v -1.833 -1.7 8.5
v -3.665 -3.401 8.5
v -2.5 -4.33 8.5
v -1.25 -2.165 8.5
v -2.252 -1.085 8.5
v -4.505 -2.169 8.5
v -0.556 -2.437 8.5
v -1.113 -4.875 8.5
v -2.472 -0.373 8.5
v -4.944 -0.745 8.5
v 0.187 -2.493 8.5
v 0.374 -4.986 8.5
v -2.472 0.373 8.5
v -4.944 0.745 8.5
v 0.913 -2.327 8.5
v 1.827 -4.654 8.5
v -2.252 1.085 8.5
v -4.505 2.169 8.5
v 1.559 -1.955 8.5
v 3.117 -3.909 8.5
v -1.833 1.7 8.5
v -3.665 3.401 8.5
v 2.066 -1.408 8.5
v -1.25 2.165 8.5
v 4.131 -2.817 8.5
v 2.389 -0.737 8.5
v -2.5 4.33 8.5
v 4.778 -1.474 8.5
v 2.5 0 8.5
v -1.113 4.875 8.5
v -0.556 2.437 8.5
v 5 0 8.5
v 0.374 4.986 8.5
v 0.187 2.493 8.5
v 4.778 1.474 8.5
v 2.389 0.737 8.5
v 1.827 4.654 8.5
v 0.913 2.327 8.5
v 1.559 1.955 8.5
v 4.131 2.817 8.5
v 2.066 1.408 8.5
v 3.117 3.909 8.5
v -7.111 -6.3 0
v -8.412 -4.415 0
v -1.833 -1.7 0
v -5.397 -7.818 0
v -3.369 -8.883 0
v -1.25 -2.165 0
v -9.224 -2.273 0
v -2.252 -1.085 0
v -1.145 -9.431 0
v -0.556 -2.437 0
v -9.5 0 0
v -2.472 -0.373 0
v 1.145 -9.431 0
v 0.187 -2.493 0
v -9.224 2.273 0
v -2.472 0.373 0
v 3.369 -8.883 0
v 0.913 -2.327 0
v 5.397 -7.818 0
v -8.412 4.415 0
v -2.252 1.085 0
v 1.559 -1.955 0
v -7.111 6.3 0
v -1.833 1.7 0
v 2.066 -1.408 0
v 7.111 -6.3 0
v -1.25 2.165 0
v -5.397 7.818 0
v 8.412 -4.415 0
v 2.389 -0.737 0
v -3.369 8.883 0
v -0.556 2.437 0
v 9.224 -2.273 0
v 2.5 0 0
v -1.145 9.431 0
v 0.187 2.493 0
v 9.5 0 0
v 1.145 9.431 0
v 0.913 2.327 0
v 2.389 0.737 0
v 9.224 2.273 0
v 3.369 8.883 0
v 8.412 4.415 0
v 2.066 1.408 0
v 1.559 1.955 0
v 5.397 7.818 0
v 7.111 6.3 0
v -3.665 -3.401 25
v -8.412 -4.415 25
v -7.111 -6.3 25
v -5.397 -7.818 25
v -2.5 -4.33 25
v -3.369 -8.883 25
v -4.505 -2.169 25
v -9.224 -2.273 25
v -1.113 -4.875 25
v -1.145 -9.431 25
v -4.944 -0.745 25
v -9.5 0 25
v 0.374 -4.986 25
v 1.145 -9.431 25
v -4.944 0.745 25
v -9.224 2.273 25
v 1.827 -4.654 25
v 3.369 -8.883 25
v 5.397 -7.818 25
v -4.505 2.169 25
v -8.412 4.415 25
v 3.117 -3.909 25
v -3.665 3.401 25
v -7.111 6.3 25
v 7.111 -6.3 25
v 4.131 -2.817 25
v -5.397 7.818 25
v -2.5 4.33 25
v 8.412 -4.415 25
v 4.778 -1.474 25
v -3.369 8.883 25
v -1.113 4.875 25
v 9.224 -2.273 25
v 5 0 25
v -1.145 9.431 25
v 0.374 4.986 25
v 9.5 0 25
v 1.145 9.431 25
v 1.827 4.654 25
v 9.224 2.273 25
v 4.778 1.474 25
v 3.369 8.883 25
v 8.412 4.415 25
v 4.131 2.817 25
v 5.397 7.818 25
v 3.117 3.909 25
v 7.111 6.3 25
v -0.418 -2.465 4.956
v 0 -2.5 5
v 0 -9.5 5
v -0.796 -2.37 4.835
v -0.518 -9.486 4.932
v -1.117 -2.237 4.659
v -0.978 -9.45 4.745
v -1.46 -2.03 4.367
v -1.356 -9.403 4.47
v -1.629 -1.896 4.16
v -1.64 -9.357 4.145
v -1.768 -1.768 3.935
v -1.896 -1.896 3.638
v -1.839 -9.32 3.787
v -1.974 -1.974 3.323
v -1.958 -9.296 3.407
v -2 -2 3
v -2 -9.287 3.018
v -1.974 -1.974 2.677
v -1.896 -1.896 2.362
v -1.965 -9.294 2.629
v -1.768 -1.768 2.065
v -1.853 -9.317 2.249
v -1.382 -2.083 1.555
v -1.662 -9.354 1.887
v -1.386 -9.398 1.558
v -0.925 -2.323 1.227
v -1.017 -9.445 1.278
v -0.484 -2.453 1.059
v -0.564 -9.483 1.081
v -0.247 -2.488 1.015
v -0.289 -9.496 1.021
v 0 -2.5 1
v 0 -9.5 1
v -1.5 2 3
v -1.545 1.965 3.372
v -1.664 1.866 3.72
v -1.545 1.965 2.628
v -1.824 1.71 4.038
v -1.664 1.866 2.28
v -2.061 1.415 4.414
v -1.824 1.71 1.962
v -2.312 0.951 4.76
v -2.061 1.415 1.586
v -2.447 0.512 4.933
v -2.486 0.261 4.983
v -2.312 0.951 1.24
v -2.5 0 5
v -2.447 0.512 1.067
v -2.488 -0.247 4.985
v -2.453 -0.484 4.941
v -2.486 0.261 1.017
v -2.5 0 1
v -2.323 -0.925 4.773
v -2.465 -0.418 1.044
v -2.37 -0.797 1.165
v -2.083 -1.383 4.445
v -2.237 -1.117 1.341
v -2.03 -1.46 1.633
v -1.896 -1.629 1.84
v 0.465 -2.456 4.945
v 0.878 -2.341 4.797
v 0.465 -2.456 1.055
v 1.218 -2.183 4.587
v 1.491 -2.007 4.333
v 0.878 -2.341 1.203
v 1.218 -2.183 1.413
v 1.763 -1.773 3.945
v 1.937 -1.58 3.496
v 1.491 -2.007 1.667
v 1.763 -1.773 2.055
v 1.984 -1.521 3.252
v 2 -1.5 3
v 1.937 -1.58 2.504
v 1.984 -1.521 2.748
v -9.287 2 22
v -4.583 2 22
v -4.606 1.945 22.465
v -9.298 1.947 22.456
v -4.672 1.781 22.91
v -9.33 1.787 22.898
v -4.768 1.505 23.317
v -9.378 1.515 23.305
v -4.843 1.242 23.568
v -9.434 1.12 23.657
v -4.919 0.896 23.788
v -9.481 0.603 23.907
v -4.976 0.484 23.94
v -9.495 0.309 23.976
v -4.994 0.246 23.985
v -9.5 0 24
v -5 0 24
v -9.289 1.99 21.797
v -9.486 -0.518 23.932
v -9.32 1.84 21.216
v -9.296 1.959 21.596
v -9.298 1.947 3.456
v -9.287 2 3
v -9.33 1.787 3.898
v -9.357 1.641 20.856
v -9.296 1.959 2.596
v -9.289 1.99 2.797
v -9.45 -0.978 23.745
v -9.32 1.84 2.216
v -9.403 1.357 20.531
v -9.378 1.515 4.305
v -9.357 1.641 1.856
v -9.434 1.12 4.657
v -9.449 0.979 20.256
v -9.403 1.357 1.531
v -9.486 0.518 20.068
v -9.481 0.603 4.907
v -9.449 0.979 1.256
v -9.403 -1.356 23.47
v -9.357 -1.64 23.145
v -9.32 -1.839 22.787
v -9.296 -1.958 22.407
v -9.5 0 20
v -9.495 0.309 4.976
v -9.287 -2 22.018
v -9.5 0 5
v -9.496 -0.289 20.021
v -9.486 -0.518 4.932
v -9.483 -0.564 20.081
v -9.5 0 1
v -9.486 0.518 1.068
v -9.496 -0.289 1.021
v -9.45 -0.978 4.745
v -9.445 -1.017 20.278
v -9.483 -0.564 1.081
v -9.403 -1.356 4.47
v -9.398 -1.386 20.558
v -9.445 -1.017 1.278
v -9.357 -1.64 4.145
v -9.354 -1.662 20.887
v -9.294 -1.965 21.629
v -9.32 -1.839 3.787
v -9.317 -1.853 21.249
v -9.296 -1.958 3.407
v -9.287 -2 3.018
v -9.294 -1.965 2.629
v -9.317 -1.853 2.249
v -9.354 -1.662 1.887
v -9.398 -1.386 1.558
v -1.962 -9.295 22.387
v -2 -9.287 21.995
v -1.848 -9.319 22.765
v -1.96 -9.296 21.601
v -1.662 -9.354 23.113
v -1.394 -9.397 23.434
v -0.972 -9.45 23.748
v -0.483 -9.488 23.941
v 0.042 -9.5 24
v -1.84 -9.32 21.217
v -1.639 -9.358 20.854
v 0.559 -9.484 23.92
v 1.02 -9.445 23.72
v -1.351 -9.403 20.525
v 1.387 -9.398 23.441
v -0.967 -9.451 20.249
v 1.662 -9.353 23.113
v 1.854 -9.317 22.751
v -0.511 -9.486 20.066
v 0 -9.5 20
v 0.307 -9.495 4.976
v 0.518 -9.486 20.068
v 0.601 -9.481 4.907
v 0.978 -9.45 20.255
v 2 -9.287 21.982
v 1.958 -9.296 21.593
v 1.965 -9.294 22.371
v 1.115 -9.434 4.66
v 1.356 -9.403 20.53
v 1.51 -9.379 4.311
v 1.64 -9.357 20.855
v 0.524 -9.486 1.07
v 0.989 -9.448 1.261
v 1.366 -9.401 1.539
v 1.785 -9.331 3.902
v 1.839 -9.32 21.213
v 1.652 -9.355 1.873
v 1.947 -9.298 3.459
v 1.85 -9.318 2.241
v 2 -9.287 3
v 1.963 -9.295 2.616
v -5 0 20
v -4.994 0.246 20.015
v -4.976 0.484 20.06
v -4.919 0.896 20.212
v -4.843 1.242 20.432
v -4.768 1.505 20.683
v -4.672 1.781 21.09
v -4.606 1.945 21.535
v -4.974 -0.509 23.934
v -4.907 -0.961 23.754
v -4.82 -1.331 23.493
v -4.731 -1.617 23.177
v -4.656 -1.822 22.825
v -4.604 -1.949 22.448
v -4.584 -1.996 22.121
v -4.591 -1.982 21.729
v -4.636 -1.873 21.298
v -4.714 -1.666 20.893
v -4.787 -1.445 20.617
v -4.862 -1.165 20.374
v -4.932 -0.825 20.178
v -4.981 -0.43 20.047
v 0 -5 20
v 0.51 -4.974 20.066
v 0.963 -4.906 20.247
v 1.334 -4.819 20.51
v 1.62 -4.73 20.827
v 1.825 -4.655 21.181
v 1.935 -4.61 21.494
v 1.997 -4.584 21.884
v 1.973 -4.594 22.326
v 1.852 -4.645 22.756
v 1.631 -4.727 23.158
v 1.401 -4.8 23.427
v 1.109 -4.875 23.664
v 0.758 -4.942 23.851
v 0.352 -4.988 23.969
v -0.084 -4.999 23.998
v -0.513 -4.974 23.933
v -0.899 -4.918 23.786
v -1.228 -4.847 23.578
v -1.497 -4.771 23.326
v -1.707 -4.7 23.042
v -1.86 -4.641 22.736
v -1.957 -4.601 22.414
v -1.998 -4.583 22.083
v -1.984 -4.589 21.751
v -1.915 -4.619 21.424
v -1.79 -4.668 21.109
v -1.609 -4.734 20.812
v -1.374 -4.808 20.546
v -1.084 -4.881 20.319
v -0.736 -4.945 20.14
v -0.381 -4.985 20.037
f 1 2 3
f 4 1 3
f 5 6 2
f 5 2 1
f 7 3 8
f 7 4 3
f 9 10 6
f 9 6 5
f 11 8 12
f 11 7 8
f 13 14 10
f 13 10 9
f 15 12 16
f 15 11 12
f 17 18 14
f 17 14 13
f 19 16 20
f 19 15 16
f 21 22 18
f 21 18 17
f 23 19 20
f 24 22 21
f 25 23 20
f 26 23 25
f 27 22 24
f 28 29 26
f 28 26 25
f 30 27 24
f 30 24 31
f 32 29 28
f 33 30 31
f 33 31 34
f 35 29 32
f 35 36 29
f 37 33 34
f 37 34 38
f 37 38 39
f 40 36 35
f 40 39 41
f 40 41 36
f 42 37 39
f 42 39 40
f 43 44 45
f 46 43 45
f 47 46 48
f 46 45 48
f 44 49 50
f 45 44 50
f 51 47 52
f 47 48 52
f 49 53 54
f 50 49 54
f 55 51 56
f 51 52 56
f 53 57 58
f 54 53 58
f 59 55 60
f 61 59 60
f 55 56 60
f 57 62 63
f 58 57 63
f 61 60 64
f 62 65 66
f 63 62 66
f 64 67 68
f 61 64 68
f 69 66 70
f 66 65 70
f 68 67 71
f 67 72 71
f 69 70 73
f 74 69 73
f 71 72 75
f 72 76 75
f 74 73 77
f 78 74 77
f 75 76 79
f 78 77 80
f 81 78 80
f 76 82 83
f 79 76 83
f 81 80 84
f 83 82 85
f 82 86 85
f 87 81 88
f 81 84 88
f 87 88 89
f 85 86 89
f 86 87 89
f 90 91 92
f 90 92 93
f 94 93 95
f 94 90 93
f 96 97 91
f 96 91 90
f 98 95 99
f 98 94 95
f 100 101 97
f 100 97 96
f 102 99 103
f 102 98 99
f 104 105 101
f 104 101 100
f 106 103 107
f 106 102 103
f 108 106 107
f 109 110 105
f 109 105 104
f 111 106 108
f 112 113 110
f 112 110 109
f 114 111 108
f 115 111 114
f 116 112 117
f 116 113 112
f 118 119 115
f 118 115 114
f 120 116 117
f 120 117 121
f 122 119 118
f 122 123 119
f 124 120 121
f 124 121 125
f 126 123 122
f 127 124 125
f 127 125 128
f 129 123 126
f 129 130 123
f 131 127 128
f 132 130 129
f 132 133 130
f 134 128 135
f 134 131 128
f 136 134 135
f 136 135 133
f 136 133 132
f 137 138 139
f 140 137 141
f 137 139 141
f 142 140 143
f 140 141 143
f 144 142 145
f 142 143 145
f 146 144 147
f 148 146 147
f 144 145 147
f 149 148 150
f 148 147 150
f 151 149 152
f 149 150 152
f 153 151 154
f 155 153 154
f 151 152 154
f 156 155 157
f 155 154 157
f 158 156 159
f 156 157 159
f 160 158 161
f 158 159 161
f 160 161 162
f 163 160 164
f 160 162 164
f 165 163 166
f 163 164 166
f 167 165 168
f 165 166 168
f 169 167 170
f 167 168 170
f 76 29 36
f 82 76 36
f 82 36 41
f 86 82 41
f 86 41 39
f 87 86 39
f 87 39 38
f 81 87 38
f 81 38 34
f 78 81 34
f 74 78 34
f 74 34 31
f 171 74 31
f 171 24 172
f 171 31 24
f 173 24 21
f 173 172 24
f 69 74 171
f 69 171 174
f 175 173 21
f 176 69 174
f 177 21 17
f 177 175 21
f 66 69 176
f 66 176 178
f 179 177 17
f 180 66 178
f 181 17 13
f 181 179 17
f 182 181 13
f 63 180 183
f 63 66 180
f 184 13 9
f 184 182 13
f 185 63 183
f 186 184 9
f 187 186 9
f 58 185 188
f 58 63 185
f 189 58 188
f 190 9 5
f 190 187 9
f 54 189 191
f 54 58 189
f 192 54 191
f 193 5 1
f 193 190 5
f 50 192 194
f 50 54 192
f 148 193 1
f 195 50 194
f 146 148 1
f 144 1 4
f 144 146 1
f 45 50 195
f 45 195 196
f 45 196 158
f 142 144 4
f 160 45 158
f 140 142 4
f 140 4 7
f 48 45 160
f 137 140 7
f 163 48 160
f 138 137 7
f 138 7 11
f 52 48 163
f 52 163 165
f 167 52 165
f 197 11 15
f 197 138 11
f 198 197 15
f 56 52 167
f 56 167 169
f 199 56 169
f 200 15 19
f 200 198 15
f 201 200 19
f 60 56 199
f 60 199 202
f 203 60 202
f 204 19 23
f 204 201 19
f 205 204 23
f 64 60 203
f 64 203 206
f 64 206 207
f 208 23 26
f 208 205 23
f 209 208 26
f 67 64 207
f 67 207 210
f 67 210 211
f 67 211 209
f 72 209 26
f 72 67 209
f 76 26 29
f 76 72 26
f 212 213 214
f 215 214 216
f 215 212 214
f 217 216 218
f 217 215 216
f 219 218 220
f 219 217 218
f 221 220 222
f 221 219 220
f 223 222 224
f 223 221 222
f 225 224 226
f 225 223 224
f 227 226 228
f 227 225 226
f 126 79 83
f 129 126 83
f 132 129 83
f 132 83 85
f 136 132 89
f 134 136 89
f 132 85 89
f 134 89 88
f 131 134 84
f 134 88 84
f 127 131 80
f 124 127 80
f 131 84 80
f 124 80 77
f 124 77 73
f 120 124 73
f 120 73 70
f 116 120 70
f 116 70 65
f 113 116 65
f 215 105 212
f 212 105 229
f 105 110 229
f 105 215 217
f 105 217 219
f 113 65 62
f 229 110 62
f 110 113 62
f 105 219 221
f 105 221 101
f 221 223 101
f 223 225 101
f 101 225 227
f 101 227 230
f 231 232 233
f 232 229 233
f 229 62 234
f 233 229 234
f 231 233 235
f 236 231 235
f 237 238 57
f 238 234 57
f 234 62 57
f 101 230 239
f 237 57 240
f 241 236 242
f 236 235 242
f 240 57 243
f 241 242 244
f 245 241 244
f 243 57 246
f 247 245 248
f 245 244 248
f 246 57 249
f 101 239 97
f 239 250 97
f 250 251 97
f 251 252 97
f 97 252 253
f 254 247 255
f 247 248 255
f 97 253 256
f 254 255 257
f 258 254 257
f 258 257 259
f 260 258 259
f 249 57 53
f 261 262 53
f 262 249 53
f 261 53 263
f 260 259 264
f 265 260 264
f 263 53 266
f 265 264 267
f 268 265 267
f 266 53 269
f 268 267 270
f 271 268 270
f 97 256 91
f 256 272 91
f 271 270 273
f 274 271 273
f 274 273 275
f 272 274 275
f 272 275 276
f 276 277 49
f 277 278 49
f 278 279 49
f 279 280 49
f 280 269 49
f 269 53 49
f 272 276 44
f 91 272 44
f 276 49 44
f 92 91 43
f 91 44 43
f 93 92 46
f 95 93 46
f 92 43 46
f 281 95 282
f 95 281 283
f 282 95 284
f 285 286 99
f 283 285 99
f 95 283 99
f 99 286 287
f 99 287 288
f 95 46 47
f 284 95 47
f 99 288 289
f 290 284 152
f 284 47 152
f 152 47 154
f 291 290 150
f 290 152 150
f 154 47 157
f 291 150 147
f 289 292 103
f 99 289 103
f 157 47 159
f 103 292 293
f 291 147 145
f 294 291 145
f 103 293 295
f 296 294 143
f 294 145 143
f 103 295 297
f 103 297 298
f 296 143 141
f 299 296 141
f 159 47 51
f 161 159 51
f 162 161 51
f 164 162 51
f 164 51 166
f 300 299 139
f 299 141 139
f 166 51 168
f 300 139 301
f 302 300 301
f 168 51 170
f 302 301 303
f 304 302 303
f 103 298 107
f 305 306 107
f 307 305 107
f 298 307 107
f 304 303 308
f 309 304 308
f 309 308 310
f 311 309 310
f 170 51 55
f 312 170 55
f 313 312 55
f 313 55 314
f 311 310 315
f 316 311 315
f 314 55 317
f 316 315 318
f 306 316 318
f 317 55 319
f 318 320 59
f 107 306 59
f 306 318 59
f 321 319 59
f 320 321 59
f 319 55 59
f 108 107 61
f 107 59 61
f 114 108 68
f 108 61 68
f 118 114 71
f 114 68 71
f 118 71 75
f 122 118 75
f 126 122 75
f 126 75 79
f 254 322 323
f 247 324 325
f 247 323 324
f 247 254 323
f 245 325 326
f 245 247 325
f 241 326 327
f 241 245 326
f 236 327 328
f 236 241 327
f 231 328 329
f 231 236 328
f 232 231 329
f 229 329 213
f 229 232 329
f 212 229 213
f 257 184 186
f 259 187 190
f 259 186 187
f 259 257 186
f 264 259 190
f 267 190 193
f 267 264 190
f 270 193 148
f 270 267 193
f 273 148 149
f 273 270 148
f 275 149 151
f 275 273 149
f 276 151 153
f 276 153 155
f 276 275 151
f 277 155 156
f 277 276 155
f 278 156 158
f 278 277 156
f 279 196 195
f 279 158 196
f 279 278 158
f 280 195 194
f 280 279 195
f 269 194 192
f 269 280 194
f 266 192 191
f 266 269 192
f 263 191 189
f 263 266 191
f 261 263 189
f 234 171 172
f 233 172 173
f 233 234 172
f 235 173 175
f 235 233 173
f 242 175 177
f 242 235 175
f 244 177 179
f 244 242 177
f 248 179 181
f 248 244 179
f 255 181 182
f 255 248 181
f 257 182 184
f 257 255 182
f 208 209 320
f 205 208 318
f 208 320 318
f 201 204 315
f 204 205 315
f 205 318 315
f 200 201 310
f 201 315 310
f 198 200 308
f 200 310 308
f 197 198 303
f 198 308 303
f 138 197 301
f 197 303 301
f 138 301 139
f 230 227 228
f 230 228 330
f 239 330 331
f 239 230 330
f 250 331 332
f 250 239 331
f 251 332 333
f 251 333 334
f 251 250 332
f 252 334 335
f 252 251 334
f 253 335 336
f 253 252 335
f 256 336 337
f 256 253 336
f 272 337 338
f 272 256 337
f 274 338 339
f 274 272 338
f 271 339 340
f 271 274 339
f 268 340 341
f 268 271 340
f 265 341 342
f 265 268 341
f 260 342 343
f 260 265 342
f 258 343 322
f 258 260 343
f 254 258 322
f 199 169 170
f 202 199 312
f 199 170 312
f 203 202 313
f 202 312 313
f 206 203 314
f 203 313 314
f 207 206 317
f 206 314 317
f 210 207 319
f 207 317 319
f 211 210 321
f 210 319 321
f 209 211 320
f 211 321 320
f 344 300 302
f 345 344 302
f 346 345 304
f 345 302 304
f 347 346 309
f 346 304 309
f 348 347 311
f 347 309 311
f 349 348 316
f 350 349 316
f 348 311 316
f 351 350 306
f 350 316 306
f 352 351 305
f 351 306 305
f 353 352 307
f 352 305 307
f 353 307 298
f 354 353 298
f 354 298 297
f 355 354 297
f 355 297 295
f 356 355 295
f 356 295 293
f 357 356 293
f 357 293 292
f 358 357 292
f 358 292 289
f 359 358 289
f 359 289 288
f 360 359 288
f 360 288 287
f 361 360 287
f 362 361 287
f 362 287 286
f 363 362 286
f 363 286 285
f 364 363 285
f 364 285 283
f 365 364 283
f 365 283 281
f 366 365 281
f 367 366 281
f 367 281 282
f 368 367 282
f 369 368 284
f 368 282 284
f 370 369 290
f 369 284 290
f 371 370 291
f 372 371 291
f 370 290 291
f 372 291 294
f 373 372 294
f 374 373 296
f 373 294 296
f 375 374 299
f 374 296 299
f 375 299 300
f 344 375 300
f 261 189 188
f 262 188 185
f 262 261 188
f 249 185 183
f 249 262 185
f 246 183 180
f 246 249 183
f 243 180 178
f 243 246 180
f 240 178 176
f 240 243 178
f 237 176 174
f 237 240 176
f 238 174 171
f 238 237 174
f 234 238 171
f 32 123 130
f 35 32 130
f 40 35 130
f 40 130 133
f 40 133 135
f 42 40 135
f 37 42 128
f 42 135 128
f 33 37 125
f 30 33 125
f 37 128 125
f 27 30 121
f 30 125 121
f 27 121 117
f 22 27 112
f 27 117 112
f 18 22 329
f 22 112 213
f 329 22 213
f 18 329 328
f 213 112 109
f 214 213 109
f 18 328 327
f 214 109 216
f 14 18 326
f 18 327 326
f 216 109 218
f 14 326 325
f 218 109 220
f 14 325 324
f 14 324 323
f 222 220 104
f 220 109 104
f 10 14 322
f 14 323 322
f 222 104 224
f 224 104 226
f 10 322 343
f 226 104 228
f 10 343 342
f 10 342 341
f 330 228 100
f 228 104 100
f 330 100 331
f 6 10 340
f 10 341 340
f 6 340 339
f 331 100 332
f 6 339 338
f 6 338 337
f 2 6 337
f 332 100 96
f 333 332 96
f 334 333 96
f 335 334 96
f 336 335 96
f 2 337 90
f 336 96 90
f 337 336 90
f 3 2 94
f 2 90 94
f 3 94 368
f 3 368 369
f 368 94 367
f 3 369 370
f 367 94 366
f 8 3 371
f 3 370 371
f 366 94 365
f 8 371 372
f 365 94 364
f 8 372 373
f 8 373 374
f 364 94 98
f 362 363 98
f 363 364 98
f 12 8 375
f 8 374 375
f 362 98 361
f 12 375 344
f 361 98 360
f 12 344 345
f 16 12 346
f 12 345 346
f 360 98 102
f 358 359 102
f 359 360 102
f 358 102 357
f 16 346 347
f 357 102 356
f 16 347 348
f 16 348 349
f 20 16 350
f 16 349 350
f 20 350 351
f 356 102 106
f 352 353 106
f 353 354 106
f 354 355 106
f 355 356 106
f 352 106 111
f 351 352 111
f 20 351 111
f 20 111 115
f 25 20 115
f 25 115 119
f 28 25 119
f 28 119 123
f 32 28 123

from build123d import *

# Parameters (mm, degrees)
SKETCH2_R           = 9.5
SKETCH2_R_2         = 2.5
BOSS_EXTRUDE1_DEPTH = 25
SKETCH3_R           = 5
CUT_EXTRUDE1_DEPTH  = 16.5
CUT_EXTRUDE2_DEPTH  = 16.5
SKETCH5_R           = 2
CUT_EXTRUDE3_DEPTH  = 9.5


with BuildPart() as part:
    # Sketch2 → Boss-Extrude1 (new body)
    with BuildSketch(Plane.XY):
        Circle(SKETCH2_R)
        Circle(SKETCH2_R_2, mode=Mode.SUBTRACT)
    extrude(amount=BOSS_EXTRUDE1_DEPTH)

    # Sketch3 → Cut-Extrude1 (cut)
    with BuildSketch(Plane.XY.offset(25)):
        Circle(SKETCH3_R)
    extrude(amount=-CUT_EXTRUDE1_DEPTH, mode=Mode.SUBTRACT)

    # Sketch4 → Cut-Extrude2 (cut)
    with BuildSketch(Plane(origin=(-15.41400196, 54.908076208, -53.970187191), x_dir=(0, 1, 0), z_dir=(1, 0, 0))):
        with BuildLine():
            ThreePointArc((-54.908076208, 58.970187191), (-56.908076208, 56.970187191), (-54.908076208, 54.970187191))
            Line((-54.908076208, 54.970187191), (-54.908076208, 58.970187191))
        make_face()
        with BuildLine():
            Line((-54.908076208, 58.970187191), (-54.908076208, 54.970187191))
            ThreePointArc((-54.908076208, 54.970187191), (-53.493862646, 55.555973629), (-52.908076208, 56.970187191))
            ThreePointArc((-52.908076208, 56.970187191), (-53.493862646, 58.384400753), (-54.908076208, 58.970187191))
        make_face()
        with BuildLine():
            ThreePointArc((-52.908076208, 75.970187191), (-53.493862646, 77.384400753), (-54.908076208, 77.970187191))
            Line((-54.908076208, 77.970187191), (-54.908076208, 73.970187191))
            ThreePointArc((-54.908076208, 73.970187191), (-53.493862646, 74.555973629), (-52.908076208, 75.970187191))
        make_face()
        with BuildLine():
            Line((-54.908076208, 73.970187191), (-54.908076208, 77.970187191))
            ThreePointArc((-54.908076208, 77.970187191), (-56.908076208, 75.970187191), (-54.908076208, 73.970187191))
        make_face()
    extrude(amount=CUT_EXTRUDE2_DEPTH, mode=Mode.SUBTRACT)

    # Sketch5 → Cut-Extrude3 (cut)
    with BuildSketch(Plane(origin=(-15.41400196, -10.091923792, -53.970187191), x_dir=(1, 0, 0), z_dir=(0, -1, 0))):
        with BuildLine():
            ThreePointArc((15.41400196, 58.970187191), (13.41400196, 56.970187191), (15.41400196, 54.970187191))
            Line((15.41400196, 54.970187191), (15.41400196, 58.970187191))
        make_face()
        with BuildLine():
            Line((15.41400196, 58.970187191), (15.41400196, 54.970187191))
            ThreePointArc((15.41400196, 54.970187191), (16.828215523, 55.555973629), (17.41400196, 56.970187191))
            ThreePointArc((17.41400196, 56.970187191), (16.828215523, 58.384400753), (15.41400196, 58.970187191))
        make_face()
        with Locations(Location((15.41400196, 75.970187191, 0), (0, 0, 270))):
            Circle(SKETCH5_R)
    extrude(amount=-CUT_EXTRUDE3_DEPTH, mode=Mode.SUBTRACT)


solid = part.part
